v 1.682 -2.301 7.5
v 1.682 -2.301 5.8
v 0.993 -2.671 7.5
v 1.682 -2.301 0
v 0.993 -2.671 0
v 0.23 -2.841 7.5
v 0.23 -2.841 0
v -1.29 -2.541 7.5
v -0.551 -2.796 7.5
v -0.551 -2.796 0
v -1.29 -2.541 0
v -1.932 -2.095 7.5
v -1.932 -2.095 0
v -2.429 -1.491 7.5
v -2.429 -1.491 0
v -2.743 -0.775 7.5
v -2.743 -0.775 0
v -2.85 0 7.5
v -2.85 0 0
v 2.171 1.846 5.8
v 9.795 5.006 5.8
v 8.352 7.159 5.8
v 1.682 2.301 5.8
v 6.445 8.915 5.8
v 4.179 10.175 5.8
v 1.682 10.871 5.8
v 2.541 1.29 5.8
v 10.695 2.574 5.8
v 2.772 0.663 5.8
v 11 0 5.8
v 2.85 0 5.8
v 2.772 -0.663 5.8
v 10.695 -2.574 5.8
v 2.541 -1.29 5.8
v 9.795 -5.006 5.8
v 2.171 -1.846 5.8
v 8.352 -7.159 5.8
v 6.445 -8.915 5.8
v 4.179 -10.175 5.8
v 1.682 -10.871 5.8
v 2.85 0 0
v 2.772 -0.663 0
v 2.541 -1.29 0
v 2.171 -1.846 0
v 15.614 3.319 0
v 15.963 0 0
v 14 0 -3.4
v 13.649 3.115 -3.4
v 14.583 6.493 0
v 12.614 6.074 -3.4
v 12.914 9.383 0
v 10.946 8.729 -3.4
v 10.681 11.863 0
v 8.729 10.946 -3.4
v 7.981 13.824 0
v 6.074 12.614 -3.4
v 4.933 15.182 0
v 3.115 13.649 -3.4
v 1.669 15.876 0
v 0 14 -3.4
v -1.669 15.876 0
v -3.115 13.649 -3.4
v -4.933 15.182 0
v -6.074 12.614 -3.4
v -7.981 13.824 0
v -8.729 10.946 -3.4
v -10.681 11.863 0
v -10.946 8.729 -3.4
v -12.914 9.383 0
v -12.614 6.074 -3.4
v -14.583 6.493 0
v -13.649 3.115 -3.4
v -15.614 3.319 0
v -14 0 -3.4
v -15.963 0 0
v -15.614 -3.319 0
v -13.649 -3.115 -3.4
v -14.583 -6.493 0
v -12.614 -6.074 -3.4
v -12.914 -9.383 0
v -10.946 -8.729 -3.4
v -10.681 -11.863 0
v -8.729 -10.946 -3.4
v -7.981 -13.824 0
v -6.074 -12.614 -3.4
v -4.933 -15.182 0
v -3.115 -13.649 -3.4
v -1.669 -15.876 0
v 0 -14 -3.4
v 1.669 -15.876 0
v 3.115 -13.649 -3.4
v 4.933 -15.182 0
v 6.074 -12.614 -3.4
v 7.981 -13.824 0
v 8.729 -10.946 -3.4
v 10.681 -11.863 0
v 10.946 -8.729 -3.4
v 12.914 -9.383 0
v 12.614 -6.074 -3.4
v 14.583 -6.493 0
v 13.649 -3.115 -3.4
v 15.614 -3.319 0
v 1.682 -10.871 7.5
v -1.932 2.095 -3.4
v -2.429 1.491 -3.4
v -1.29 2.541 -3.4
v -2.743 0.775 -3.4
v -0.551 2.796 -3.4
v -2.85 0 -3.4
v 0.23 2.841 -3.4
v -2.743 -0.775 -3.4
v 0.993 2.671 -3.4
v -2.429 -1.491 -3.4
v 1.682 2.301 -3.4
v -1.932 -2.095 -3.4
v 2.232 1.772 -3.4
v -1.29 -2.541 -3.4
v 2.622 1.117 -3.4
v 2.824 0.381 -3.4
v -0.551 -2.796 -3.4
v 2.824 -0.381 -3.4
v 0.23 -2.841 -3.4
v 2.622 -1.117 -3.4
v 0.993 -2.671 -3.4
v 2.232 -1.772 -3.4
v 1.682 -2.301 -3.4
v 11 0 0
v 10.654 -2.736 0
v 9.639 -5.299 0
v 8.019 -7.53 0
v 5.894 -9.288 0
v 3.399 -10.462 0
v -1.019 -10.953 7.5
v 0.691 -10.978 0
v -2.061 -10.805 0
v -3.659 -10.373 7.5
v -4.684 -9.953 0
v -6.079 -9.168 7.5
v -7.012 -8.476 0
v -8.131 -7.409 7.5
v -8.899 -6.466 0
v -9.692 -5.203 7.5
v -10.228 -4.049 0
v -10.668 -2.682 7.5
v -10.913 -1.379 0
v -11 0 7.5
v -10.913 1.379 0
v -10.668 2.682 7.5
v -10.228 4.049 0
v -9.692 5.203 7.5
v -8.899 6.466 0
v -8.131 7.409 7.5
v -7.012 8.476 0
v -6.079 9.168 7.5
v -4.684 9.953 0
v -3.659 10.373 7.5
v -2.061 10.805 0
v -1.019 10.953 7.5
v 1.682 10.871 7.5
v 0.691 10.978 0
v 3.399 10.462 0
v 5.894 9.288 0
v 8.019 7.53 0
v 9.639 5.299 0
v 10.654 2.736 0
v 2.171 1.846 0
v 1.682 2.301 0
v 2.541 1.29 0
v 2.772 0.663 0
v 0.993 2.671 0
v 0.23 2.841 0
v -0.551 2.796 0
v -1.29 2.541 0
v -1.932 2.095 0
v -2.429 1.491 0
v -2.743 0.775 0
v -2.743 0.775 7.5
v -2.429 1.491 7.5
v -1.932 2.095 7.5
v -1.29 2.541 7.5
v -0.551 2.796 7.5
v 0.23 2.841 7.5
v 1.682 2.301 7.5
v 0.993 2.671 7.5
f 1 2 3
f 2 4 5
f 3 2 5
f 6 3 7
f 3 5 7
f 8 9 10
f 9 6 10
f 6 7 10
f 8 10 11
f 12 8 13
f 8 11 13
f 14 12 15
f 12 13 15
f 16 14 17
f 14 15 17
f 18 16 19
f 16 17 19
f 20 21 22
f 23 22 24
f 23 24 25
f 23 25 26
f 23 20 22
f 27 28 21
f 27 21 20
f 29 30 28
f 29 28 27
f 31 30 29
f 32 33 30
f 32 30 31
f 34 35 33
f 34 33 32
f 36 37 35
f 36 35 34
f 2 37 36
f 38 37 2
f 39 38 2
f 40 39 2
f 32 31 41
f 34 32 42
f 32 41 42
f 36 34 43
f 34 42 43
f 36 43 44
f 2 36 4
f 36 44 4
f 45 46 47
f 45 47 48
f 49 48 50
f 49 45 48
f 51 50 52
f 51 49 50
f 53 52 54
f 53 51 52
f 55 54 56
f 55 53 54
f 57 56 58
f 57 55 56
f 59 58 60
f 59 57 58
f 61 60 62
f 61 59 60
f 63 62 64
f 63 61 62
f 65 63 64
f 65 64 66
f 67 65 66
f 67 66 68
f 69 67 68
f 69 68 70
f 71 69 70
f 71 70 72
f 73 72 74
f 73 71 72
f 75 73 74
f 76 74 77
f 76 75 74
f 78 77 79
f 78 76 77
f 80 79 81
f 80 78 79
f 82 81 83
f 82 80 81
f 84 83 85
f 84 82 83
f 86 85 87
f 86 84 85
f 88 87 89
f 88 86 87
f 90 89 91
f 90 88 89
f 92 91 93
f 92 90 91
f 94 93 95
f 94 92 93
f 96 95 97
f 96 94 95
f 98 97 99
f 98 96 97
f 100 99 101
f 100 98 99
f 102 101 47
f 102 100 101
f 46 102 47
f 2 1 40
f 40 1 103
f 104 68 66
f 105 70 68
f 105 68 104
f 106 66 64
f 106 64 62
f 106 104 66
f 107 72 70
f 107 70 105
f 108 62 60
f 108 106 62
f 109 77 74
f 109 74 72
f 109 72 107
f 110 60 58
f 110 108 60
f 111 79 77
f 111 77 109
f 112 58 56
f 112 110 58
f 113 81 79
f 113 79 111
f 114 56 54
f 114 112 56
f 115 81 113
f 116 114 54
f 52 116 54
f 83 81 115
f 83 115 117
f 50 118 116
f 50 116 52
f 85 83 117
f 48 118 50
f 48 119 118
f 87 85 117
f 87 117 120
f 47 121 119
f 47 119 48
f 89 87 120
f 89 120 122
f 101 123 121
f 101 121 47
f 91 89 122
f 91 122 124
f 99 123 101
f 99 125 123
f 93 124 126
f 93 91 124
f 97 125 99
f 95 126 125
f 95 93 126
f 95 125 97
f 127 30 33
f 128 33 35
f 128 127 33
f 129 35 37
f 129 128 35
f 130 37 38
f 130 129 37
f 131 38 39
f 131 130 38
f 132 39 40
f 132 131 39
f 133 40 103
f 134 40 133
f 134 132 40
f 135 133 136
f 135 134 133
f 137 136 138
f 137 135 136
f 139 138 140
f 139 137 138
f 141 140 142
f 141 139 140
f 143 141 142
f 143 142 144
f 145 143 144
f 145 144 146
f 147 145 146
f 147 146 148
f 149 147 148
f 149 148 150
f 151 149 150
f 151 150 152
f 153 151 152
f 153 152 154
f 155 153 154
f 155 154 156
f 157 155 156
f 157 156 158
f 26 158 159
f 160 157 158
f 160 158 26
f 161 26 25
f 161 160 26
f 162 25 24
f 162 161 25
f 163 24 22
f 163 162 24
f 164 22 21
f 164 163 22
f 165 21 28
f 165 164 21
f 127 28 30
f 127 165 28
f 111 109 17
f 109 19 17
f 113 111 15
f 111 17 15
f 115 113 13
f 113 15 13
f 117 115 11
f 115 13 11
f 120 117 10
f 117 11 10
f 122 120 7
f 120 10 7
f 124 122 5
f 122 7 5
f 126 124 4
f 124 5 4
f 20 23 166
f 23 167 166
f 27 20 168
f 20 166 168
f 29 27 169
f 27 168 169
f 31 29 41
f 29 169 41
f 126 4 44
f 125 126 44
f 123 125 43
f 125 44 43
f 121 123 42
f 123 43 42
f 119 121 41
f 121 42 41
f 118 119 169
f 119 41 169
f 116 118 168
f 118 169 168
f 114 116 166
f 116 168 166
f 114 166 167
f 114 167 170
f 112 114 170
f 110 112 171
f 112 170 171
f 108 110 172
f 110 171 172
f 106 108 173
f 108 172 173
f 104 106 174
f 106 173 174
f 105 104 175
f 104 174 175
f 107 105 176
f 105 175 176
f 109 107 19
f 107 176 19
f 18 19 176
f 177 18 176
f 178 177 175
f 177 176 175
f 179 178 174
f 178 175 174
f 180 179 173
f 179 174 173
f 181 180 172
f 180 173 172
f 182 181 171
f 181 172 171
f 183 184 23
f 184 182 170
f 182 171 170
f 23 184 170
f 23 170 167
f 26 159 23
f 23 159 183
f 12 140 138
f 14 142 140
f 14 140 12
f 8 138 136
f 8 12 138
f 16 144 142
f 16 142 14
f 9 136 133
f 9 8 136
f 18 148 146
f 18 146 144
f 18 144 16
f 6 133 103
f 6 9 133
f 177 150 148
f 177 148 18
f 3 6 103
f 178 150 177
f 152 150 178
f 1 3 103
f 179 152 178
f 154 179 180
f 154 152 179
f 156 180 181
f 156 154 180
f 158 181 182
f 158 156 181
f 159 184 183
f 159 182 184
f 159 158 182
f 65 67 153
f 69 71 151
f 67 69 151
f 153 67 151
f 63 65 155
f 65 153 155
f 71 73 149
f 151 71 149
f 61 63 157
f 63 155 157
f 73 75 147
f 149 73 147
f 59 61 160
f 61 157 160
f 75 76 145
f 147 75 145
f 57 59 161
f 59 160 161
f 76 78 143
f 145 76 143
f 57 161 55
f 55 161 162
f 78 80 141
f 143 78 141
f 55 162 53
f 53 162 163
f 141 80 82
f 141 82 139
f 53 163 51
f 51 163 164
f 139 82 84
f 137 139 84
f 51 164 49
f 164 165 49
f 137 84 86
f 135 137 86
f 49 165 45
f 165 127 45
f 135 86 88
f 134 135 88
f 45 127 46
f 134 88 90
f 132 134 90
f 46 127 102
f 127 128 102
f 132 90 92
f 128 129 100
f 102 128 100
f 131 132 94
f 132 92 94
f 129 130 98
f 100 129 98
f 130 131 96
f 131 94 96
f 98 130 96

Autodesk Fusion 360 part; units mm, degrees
sketch "Sketch1" plane through (0, 0, 0) normal (0, 0, 1) x (1, 0, 0)
  circle A0 centre (0, 0) radius 11
  circle A1 centre (0, 0) radius 2.85
  dimension "d1" = 22
  dimension "d2" = 5.7
extrude "Extrude1" add sketch "Sketch1" along normal blind 7.5
sketch "Sketch2" plane through (0, 0, 7.5) normal (0, 0, 1) x (-1, 0, 0)
  circle A0 centre (0, 0) radius 2.85
  circle A1 centre (0, 0) radius 11
  line L0 (-1.6821, -10.8706) -> (-1.6821, 10.8706)
extrude "Extrude2" cut sketch "Sketch2" against normal blind 1.7 contours A0 A1 L0 picked at (-5.1344, 6.4731)
sketch "Sketch3" plane through (0, 0, 0) normal (0, 0, -1) x (1, 0, 0)
  circle A0 centre (0, 0) radius 2.85
  circle A1 centre (0, 0) radius 11
  circle A2 centre (0, 0) radius 14
  dimension "d7" = 28
extrude "Extrude3" add sketch "Sketch3" against normal blind 3.4 draft 30 from surface at 3.4 contours A1 | A2
extrude "Extrude4" cut sketch "Sketch2" against normal up to surface (10.9 mm away) contours A0 L0 | A0 L0
